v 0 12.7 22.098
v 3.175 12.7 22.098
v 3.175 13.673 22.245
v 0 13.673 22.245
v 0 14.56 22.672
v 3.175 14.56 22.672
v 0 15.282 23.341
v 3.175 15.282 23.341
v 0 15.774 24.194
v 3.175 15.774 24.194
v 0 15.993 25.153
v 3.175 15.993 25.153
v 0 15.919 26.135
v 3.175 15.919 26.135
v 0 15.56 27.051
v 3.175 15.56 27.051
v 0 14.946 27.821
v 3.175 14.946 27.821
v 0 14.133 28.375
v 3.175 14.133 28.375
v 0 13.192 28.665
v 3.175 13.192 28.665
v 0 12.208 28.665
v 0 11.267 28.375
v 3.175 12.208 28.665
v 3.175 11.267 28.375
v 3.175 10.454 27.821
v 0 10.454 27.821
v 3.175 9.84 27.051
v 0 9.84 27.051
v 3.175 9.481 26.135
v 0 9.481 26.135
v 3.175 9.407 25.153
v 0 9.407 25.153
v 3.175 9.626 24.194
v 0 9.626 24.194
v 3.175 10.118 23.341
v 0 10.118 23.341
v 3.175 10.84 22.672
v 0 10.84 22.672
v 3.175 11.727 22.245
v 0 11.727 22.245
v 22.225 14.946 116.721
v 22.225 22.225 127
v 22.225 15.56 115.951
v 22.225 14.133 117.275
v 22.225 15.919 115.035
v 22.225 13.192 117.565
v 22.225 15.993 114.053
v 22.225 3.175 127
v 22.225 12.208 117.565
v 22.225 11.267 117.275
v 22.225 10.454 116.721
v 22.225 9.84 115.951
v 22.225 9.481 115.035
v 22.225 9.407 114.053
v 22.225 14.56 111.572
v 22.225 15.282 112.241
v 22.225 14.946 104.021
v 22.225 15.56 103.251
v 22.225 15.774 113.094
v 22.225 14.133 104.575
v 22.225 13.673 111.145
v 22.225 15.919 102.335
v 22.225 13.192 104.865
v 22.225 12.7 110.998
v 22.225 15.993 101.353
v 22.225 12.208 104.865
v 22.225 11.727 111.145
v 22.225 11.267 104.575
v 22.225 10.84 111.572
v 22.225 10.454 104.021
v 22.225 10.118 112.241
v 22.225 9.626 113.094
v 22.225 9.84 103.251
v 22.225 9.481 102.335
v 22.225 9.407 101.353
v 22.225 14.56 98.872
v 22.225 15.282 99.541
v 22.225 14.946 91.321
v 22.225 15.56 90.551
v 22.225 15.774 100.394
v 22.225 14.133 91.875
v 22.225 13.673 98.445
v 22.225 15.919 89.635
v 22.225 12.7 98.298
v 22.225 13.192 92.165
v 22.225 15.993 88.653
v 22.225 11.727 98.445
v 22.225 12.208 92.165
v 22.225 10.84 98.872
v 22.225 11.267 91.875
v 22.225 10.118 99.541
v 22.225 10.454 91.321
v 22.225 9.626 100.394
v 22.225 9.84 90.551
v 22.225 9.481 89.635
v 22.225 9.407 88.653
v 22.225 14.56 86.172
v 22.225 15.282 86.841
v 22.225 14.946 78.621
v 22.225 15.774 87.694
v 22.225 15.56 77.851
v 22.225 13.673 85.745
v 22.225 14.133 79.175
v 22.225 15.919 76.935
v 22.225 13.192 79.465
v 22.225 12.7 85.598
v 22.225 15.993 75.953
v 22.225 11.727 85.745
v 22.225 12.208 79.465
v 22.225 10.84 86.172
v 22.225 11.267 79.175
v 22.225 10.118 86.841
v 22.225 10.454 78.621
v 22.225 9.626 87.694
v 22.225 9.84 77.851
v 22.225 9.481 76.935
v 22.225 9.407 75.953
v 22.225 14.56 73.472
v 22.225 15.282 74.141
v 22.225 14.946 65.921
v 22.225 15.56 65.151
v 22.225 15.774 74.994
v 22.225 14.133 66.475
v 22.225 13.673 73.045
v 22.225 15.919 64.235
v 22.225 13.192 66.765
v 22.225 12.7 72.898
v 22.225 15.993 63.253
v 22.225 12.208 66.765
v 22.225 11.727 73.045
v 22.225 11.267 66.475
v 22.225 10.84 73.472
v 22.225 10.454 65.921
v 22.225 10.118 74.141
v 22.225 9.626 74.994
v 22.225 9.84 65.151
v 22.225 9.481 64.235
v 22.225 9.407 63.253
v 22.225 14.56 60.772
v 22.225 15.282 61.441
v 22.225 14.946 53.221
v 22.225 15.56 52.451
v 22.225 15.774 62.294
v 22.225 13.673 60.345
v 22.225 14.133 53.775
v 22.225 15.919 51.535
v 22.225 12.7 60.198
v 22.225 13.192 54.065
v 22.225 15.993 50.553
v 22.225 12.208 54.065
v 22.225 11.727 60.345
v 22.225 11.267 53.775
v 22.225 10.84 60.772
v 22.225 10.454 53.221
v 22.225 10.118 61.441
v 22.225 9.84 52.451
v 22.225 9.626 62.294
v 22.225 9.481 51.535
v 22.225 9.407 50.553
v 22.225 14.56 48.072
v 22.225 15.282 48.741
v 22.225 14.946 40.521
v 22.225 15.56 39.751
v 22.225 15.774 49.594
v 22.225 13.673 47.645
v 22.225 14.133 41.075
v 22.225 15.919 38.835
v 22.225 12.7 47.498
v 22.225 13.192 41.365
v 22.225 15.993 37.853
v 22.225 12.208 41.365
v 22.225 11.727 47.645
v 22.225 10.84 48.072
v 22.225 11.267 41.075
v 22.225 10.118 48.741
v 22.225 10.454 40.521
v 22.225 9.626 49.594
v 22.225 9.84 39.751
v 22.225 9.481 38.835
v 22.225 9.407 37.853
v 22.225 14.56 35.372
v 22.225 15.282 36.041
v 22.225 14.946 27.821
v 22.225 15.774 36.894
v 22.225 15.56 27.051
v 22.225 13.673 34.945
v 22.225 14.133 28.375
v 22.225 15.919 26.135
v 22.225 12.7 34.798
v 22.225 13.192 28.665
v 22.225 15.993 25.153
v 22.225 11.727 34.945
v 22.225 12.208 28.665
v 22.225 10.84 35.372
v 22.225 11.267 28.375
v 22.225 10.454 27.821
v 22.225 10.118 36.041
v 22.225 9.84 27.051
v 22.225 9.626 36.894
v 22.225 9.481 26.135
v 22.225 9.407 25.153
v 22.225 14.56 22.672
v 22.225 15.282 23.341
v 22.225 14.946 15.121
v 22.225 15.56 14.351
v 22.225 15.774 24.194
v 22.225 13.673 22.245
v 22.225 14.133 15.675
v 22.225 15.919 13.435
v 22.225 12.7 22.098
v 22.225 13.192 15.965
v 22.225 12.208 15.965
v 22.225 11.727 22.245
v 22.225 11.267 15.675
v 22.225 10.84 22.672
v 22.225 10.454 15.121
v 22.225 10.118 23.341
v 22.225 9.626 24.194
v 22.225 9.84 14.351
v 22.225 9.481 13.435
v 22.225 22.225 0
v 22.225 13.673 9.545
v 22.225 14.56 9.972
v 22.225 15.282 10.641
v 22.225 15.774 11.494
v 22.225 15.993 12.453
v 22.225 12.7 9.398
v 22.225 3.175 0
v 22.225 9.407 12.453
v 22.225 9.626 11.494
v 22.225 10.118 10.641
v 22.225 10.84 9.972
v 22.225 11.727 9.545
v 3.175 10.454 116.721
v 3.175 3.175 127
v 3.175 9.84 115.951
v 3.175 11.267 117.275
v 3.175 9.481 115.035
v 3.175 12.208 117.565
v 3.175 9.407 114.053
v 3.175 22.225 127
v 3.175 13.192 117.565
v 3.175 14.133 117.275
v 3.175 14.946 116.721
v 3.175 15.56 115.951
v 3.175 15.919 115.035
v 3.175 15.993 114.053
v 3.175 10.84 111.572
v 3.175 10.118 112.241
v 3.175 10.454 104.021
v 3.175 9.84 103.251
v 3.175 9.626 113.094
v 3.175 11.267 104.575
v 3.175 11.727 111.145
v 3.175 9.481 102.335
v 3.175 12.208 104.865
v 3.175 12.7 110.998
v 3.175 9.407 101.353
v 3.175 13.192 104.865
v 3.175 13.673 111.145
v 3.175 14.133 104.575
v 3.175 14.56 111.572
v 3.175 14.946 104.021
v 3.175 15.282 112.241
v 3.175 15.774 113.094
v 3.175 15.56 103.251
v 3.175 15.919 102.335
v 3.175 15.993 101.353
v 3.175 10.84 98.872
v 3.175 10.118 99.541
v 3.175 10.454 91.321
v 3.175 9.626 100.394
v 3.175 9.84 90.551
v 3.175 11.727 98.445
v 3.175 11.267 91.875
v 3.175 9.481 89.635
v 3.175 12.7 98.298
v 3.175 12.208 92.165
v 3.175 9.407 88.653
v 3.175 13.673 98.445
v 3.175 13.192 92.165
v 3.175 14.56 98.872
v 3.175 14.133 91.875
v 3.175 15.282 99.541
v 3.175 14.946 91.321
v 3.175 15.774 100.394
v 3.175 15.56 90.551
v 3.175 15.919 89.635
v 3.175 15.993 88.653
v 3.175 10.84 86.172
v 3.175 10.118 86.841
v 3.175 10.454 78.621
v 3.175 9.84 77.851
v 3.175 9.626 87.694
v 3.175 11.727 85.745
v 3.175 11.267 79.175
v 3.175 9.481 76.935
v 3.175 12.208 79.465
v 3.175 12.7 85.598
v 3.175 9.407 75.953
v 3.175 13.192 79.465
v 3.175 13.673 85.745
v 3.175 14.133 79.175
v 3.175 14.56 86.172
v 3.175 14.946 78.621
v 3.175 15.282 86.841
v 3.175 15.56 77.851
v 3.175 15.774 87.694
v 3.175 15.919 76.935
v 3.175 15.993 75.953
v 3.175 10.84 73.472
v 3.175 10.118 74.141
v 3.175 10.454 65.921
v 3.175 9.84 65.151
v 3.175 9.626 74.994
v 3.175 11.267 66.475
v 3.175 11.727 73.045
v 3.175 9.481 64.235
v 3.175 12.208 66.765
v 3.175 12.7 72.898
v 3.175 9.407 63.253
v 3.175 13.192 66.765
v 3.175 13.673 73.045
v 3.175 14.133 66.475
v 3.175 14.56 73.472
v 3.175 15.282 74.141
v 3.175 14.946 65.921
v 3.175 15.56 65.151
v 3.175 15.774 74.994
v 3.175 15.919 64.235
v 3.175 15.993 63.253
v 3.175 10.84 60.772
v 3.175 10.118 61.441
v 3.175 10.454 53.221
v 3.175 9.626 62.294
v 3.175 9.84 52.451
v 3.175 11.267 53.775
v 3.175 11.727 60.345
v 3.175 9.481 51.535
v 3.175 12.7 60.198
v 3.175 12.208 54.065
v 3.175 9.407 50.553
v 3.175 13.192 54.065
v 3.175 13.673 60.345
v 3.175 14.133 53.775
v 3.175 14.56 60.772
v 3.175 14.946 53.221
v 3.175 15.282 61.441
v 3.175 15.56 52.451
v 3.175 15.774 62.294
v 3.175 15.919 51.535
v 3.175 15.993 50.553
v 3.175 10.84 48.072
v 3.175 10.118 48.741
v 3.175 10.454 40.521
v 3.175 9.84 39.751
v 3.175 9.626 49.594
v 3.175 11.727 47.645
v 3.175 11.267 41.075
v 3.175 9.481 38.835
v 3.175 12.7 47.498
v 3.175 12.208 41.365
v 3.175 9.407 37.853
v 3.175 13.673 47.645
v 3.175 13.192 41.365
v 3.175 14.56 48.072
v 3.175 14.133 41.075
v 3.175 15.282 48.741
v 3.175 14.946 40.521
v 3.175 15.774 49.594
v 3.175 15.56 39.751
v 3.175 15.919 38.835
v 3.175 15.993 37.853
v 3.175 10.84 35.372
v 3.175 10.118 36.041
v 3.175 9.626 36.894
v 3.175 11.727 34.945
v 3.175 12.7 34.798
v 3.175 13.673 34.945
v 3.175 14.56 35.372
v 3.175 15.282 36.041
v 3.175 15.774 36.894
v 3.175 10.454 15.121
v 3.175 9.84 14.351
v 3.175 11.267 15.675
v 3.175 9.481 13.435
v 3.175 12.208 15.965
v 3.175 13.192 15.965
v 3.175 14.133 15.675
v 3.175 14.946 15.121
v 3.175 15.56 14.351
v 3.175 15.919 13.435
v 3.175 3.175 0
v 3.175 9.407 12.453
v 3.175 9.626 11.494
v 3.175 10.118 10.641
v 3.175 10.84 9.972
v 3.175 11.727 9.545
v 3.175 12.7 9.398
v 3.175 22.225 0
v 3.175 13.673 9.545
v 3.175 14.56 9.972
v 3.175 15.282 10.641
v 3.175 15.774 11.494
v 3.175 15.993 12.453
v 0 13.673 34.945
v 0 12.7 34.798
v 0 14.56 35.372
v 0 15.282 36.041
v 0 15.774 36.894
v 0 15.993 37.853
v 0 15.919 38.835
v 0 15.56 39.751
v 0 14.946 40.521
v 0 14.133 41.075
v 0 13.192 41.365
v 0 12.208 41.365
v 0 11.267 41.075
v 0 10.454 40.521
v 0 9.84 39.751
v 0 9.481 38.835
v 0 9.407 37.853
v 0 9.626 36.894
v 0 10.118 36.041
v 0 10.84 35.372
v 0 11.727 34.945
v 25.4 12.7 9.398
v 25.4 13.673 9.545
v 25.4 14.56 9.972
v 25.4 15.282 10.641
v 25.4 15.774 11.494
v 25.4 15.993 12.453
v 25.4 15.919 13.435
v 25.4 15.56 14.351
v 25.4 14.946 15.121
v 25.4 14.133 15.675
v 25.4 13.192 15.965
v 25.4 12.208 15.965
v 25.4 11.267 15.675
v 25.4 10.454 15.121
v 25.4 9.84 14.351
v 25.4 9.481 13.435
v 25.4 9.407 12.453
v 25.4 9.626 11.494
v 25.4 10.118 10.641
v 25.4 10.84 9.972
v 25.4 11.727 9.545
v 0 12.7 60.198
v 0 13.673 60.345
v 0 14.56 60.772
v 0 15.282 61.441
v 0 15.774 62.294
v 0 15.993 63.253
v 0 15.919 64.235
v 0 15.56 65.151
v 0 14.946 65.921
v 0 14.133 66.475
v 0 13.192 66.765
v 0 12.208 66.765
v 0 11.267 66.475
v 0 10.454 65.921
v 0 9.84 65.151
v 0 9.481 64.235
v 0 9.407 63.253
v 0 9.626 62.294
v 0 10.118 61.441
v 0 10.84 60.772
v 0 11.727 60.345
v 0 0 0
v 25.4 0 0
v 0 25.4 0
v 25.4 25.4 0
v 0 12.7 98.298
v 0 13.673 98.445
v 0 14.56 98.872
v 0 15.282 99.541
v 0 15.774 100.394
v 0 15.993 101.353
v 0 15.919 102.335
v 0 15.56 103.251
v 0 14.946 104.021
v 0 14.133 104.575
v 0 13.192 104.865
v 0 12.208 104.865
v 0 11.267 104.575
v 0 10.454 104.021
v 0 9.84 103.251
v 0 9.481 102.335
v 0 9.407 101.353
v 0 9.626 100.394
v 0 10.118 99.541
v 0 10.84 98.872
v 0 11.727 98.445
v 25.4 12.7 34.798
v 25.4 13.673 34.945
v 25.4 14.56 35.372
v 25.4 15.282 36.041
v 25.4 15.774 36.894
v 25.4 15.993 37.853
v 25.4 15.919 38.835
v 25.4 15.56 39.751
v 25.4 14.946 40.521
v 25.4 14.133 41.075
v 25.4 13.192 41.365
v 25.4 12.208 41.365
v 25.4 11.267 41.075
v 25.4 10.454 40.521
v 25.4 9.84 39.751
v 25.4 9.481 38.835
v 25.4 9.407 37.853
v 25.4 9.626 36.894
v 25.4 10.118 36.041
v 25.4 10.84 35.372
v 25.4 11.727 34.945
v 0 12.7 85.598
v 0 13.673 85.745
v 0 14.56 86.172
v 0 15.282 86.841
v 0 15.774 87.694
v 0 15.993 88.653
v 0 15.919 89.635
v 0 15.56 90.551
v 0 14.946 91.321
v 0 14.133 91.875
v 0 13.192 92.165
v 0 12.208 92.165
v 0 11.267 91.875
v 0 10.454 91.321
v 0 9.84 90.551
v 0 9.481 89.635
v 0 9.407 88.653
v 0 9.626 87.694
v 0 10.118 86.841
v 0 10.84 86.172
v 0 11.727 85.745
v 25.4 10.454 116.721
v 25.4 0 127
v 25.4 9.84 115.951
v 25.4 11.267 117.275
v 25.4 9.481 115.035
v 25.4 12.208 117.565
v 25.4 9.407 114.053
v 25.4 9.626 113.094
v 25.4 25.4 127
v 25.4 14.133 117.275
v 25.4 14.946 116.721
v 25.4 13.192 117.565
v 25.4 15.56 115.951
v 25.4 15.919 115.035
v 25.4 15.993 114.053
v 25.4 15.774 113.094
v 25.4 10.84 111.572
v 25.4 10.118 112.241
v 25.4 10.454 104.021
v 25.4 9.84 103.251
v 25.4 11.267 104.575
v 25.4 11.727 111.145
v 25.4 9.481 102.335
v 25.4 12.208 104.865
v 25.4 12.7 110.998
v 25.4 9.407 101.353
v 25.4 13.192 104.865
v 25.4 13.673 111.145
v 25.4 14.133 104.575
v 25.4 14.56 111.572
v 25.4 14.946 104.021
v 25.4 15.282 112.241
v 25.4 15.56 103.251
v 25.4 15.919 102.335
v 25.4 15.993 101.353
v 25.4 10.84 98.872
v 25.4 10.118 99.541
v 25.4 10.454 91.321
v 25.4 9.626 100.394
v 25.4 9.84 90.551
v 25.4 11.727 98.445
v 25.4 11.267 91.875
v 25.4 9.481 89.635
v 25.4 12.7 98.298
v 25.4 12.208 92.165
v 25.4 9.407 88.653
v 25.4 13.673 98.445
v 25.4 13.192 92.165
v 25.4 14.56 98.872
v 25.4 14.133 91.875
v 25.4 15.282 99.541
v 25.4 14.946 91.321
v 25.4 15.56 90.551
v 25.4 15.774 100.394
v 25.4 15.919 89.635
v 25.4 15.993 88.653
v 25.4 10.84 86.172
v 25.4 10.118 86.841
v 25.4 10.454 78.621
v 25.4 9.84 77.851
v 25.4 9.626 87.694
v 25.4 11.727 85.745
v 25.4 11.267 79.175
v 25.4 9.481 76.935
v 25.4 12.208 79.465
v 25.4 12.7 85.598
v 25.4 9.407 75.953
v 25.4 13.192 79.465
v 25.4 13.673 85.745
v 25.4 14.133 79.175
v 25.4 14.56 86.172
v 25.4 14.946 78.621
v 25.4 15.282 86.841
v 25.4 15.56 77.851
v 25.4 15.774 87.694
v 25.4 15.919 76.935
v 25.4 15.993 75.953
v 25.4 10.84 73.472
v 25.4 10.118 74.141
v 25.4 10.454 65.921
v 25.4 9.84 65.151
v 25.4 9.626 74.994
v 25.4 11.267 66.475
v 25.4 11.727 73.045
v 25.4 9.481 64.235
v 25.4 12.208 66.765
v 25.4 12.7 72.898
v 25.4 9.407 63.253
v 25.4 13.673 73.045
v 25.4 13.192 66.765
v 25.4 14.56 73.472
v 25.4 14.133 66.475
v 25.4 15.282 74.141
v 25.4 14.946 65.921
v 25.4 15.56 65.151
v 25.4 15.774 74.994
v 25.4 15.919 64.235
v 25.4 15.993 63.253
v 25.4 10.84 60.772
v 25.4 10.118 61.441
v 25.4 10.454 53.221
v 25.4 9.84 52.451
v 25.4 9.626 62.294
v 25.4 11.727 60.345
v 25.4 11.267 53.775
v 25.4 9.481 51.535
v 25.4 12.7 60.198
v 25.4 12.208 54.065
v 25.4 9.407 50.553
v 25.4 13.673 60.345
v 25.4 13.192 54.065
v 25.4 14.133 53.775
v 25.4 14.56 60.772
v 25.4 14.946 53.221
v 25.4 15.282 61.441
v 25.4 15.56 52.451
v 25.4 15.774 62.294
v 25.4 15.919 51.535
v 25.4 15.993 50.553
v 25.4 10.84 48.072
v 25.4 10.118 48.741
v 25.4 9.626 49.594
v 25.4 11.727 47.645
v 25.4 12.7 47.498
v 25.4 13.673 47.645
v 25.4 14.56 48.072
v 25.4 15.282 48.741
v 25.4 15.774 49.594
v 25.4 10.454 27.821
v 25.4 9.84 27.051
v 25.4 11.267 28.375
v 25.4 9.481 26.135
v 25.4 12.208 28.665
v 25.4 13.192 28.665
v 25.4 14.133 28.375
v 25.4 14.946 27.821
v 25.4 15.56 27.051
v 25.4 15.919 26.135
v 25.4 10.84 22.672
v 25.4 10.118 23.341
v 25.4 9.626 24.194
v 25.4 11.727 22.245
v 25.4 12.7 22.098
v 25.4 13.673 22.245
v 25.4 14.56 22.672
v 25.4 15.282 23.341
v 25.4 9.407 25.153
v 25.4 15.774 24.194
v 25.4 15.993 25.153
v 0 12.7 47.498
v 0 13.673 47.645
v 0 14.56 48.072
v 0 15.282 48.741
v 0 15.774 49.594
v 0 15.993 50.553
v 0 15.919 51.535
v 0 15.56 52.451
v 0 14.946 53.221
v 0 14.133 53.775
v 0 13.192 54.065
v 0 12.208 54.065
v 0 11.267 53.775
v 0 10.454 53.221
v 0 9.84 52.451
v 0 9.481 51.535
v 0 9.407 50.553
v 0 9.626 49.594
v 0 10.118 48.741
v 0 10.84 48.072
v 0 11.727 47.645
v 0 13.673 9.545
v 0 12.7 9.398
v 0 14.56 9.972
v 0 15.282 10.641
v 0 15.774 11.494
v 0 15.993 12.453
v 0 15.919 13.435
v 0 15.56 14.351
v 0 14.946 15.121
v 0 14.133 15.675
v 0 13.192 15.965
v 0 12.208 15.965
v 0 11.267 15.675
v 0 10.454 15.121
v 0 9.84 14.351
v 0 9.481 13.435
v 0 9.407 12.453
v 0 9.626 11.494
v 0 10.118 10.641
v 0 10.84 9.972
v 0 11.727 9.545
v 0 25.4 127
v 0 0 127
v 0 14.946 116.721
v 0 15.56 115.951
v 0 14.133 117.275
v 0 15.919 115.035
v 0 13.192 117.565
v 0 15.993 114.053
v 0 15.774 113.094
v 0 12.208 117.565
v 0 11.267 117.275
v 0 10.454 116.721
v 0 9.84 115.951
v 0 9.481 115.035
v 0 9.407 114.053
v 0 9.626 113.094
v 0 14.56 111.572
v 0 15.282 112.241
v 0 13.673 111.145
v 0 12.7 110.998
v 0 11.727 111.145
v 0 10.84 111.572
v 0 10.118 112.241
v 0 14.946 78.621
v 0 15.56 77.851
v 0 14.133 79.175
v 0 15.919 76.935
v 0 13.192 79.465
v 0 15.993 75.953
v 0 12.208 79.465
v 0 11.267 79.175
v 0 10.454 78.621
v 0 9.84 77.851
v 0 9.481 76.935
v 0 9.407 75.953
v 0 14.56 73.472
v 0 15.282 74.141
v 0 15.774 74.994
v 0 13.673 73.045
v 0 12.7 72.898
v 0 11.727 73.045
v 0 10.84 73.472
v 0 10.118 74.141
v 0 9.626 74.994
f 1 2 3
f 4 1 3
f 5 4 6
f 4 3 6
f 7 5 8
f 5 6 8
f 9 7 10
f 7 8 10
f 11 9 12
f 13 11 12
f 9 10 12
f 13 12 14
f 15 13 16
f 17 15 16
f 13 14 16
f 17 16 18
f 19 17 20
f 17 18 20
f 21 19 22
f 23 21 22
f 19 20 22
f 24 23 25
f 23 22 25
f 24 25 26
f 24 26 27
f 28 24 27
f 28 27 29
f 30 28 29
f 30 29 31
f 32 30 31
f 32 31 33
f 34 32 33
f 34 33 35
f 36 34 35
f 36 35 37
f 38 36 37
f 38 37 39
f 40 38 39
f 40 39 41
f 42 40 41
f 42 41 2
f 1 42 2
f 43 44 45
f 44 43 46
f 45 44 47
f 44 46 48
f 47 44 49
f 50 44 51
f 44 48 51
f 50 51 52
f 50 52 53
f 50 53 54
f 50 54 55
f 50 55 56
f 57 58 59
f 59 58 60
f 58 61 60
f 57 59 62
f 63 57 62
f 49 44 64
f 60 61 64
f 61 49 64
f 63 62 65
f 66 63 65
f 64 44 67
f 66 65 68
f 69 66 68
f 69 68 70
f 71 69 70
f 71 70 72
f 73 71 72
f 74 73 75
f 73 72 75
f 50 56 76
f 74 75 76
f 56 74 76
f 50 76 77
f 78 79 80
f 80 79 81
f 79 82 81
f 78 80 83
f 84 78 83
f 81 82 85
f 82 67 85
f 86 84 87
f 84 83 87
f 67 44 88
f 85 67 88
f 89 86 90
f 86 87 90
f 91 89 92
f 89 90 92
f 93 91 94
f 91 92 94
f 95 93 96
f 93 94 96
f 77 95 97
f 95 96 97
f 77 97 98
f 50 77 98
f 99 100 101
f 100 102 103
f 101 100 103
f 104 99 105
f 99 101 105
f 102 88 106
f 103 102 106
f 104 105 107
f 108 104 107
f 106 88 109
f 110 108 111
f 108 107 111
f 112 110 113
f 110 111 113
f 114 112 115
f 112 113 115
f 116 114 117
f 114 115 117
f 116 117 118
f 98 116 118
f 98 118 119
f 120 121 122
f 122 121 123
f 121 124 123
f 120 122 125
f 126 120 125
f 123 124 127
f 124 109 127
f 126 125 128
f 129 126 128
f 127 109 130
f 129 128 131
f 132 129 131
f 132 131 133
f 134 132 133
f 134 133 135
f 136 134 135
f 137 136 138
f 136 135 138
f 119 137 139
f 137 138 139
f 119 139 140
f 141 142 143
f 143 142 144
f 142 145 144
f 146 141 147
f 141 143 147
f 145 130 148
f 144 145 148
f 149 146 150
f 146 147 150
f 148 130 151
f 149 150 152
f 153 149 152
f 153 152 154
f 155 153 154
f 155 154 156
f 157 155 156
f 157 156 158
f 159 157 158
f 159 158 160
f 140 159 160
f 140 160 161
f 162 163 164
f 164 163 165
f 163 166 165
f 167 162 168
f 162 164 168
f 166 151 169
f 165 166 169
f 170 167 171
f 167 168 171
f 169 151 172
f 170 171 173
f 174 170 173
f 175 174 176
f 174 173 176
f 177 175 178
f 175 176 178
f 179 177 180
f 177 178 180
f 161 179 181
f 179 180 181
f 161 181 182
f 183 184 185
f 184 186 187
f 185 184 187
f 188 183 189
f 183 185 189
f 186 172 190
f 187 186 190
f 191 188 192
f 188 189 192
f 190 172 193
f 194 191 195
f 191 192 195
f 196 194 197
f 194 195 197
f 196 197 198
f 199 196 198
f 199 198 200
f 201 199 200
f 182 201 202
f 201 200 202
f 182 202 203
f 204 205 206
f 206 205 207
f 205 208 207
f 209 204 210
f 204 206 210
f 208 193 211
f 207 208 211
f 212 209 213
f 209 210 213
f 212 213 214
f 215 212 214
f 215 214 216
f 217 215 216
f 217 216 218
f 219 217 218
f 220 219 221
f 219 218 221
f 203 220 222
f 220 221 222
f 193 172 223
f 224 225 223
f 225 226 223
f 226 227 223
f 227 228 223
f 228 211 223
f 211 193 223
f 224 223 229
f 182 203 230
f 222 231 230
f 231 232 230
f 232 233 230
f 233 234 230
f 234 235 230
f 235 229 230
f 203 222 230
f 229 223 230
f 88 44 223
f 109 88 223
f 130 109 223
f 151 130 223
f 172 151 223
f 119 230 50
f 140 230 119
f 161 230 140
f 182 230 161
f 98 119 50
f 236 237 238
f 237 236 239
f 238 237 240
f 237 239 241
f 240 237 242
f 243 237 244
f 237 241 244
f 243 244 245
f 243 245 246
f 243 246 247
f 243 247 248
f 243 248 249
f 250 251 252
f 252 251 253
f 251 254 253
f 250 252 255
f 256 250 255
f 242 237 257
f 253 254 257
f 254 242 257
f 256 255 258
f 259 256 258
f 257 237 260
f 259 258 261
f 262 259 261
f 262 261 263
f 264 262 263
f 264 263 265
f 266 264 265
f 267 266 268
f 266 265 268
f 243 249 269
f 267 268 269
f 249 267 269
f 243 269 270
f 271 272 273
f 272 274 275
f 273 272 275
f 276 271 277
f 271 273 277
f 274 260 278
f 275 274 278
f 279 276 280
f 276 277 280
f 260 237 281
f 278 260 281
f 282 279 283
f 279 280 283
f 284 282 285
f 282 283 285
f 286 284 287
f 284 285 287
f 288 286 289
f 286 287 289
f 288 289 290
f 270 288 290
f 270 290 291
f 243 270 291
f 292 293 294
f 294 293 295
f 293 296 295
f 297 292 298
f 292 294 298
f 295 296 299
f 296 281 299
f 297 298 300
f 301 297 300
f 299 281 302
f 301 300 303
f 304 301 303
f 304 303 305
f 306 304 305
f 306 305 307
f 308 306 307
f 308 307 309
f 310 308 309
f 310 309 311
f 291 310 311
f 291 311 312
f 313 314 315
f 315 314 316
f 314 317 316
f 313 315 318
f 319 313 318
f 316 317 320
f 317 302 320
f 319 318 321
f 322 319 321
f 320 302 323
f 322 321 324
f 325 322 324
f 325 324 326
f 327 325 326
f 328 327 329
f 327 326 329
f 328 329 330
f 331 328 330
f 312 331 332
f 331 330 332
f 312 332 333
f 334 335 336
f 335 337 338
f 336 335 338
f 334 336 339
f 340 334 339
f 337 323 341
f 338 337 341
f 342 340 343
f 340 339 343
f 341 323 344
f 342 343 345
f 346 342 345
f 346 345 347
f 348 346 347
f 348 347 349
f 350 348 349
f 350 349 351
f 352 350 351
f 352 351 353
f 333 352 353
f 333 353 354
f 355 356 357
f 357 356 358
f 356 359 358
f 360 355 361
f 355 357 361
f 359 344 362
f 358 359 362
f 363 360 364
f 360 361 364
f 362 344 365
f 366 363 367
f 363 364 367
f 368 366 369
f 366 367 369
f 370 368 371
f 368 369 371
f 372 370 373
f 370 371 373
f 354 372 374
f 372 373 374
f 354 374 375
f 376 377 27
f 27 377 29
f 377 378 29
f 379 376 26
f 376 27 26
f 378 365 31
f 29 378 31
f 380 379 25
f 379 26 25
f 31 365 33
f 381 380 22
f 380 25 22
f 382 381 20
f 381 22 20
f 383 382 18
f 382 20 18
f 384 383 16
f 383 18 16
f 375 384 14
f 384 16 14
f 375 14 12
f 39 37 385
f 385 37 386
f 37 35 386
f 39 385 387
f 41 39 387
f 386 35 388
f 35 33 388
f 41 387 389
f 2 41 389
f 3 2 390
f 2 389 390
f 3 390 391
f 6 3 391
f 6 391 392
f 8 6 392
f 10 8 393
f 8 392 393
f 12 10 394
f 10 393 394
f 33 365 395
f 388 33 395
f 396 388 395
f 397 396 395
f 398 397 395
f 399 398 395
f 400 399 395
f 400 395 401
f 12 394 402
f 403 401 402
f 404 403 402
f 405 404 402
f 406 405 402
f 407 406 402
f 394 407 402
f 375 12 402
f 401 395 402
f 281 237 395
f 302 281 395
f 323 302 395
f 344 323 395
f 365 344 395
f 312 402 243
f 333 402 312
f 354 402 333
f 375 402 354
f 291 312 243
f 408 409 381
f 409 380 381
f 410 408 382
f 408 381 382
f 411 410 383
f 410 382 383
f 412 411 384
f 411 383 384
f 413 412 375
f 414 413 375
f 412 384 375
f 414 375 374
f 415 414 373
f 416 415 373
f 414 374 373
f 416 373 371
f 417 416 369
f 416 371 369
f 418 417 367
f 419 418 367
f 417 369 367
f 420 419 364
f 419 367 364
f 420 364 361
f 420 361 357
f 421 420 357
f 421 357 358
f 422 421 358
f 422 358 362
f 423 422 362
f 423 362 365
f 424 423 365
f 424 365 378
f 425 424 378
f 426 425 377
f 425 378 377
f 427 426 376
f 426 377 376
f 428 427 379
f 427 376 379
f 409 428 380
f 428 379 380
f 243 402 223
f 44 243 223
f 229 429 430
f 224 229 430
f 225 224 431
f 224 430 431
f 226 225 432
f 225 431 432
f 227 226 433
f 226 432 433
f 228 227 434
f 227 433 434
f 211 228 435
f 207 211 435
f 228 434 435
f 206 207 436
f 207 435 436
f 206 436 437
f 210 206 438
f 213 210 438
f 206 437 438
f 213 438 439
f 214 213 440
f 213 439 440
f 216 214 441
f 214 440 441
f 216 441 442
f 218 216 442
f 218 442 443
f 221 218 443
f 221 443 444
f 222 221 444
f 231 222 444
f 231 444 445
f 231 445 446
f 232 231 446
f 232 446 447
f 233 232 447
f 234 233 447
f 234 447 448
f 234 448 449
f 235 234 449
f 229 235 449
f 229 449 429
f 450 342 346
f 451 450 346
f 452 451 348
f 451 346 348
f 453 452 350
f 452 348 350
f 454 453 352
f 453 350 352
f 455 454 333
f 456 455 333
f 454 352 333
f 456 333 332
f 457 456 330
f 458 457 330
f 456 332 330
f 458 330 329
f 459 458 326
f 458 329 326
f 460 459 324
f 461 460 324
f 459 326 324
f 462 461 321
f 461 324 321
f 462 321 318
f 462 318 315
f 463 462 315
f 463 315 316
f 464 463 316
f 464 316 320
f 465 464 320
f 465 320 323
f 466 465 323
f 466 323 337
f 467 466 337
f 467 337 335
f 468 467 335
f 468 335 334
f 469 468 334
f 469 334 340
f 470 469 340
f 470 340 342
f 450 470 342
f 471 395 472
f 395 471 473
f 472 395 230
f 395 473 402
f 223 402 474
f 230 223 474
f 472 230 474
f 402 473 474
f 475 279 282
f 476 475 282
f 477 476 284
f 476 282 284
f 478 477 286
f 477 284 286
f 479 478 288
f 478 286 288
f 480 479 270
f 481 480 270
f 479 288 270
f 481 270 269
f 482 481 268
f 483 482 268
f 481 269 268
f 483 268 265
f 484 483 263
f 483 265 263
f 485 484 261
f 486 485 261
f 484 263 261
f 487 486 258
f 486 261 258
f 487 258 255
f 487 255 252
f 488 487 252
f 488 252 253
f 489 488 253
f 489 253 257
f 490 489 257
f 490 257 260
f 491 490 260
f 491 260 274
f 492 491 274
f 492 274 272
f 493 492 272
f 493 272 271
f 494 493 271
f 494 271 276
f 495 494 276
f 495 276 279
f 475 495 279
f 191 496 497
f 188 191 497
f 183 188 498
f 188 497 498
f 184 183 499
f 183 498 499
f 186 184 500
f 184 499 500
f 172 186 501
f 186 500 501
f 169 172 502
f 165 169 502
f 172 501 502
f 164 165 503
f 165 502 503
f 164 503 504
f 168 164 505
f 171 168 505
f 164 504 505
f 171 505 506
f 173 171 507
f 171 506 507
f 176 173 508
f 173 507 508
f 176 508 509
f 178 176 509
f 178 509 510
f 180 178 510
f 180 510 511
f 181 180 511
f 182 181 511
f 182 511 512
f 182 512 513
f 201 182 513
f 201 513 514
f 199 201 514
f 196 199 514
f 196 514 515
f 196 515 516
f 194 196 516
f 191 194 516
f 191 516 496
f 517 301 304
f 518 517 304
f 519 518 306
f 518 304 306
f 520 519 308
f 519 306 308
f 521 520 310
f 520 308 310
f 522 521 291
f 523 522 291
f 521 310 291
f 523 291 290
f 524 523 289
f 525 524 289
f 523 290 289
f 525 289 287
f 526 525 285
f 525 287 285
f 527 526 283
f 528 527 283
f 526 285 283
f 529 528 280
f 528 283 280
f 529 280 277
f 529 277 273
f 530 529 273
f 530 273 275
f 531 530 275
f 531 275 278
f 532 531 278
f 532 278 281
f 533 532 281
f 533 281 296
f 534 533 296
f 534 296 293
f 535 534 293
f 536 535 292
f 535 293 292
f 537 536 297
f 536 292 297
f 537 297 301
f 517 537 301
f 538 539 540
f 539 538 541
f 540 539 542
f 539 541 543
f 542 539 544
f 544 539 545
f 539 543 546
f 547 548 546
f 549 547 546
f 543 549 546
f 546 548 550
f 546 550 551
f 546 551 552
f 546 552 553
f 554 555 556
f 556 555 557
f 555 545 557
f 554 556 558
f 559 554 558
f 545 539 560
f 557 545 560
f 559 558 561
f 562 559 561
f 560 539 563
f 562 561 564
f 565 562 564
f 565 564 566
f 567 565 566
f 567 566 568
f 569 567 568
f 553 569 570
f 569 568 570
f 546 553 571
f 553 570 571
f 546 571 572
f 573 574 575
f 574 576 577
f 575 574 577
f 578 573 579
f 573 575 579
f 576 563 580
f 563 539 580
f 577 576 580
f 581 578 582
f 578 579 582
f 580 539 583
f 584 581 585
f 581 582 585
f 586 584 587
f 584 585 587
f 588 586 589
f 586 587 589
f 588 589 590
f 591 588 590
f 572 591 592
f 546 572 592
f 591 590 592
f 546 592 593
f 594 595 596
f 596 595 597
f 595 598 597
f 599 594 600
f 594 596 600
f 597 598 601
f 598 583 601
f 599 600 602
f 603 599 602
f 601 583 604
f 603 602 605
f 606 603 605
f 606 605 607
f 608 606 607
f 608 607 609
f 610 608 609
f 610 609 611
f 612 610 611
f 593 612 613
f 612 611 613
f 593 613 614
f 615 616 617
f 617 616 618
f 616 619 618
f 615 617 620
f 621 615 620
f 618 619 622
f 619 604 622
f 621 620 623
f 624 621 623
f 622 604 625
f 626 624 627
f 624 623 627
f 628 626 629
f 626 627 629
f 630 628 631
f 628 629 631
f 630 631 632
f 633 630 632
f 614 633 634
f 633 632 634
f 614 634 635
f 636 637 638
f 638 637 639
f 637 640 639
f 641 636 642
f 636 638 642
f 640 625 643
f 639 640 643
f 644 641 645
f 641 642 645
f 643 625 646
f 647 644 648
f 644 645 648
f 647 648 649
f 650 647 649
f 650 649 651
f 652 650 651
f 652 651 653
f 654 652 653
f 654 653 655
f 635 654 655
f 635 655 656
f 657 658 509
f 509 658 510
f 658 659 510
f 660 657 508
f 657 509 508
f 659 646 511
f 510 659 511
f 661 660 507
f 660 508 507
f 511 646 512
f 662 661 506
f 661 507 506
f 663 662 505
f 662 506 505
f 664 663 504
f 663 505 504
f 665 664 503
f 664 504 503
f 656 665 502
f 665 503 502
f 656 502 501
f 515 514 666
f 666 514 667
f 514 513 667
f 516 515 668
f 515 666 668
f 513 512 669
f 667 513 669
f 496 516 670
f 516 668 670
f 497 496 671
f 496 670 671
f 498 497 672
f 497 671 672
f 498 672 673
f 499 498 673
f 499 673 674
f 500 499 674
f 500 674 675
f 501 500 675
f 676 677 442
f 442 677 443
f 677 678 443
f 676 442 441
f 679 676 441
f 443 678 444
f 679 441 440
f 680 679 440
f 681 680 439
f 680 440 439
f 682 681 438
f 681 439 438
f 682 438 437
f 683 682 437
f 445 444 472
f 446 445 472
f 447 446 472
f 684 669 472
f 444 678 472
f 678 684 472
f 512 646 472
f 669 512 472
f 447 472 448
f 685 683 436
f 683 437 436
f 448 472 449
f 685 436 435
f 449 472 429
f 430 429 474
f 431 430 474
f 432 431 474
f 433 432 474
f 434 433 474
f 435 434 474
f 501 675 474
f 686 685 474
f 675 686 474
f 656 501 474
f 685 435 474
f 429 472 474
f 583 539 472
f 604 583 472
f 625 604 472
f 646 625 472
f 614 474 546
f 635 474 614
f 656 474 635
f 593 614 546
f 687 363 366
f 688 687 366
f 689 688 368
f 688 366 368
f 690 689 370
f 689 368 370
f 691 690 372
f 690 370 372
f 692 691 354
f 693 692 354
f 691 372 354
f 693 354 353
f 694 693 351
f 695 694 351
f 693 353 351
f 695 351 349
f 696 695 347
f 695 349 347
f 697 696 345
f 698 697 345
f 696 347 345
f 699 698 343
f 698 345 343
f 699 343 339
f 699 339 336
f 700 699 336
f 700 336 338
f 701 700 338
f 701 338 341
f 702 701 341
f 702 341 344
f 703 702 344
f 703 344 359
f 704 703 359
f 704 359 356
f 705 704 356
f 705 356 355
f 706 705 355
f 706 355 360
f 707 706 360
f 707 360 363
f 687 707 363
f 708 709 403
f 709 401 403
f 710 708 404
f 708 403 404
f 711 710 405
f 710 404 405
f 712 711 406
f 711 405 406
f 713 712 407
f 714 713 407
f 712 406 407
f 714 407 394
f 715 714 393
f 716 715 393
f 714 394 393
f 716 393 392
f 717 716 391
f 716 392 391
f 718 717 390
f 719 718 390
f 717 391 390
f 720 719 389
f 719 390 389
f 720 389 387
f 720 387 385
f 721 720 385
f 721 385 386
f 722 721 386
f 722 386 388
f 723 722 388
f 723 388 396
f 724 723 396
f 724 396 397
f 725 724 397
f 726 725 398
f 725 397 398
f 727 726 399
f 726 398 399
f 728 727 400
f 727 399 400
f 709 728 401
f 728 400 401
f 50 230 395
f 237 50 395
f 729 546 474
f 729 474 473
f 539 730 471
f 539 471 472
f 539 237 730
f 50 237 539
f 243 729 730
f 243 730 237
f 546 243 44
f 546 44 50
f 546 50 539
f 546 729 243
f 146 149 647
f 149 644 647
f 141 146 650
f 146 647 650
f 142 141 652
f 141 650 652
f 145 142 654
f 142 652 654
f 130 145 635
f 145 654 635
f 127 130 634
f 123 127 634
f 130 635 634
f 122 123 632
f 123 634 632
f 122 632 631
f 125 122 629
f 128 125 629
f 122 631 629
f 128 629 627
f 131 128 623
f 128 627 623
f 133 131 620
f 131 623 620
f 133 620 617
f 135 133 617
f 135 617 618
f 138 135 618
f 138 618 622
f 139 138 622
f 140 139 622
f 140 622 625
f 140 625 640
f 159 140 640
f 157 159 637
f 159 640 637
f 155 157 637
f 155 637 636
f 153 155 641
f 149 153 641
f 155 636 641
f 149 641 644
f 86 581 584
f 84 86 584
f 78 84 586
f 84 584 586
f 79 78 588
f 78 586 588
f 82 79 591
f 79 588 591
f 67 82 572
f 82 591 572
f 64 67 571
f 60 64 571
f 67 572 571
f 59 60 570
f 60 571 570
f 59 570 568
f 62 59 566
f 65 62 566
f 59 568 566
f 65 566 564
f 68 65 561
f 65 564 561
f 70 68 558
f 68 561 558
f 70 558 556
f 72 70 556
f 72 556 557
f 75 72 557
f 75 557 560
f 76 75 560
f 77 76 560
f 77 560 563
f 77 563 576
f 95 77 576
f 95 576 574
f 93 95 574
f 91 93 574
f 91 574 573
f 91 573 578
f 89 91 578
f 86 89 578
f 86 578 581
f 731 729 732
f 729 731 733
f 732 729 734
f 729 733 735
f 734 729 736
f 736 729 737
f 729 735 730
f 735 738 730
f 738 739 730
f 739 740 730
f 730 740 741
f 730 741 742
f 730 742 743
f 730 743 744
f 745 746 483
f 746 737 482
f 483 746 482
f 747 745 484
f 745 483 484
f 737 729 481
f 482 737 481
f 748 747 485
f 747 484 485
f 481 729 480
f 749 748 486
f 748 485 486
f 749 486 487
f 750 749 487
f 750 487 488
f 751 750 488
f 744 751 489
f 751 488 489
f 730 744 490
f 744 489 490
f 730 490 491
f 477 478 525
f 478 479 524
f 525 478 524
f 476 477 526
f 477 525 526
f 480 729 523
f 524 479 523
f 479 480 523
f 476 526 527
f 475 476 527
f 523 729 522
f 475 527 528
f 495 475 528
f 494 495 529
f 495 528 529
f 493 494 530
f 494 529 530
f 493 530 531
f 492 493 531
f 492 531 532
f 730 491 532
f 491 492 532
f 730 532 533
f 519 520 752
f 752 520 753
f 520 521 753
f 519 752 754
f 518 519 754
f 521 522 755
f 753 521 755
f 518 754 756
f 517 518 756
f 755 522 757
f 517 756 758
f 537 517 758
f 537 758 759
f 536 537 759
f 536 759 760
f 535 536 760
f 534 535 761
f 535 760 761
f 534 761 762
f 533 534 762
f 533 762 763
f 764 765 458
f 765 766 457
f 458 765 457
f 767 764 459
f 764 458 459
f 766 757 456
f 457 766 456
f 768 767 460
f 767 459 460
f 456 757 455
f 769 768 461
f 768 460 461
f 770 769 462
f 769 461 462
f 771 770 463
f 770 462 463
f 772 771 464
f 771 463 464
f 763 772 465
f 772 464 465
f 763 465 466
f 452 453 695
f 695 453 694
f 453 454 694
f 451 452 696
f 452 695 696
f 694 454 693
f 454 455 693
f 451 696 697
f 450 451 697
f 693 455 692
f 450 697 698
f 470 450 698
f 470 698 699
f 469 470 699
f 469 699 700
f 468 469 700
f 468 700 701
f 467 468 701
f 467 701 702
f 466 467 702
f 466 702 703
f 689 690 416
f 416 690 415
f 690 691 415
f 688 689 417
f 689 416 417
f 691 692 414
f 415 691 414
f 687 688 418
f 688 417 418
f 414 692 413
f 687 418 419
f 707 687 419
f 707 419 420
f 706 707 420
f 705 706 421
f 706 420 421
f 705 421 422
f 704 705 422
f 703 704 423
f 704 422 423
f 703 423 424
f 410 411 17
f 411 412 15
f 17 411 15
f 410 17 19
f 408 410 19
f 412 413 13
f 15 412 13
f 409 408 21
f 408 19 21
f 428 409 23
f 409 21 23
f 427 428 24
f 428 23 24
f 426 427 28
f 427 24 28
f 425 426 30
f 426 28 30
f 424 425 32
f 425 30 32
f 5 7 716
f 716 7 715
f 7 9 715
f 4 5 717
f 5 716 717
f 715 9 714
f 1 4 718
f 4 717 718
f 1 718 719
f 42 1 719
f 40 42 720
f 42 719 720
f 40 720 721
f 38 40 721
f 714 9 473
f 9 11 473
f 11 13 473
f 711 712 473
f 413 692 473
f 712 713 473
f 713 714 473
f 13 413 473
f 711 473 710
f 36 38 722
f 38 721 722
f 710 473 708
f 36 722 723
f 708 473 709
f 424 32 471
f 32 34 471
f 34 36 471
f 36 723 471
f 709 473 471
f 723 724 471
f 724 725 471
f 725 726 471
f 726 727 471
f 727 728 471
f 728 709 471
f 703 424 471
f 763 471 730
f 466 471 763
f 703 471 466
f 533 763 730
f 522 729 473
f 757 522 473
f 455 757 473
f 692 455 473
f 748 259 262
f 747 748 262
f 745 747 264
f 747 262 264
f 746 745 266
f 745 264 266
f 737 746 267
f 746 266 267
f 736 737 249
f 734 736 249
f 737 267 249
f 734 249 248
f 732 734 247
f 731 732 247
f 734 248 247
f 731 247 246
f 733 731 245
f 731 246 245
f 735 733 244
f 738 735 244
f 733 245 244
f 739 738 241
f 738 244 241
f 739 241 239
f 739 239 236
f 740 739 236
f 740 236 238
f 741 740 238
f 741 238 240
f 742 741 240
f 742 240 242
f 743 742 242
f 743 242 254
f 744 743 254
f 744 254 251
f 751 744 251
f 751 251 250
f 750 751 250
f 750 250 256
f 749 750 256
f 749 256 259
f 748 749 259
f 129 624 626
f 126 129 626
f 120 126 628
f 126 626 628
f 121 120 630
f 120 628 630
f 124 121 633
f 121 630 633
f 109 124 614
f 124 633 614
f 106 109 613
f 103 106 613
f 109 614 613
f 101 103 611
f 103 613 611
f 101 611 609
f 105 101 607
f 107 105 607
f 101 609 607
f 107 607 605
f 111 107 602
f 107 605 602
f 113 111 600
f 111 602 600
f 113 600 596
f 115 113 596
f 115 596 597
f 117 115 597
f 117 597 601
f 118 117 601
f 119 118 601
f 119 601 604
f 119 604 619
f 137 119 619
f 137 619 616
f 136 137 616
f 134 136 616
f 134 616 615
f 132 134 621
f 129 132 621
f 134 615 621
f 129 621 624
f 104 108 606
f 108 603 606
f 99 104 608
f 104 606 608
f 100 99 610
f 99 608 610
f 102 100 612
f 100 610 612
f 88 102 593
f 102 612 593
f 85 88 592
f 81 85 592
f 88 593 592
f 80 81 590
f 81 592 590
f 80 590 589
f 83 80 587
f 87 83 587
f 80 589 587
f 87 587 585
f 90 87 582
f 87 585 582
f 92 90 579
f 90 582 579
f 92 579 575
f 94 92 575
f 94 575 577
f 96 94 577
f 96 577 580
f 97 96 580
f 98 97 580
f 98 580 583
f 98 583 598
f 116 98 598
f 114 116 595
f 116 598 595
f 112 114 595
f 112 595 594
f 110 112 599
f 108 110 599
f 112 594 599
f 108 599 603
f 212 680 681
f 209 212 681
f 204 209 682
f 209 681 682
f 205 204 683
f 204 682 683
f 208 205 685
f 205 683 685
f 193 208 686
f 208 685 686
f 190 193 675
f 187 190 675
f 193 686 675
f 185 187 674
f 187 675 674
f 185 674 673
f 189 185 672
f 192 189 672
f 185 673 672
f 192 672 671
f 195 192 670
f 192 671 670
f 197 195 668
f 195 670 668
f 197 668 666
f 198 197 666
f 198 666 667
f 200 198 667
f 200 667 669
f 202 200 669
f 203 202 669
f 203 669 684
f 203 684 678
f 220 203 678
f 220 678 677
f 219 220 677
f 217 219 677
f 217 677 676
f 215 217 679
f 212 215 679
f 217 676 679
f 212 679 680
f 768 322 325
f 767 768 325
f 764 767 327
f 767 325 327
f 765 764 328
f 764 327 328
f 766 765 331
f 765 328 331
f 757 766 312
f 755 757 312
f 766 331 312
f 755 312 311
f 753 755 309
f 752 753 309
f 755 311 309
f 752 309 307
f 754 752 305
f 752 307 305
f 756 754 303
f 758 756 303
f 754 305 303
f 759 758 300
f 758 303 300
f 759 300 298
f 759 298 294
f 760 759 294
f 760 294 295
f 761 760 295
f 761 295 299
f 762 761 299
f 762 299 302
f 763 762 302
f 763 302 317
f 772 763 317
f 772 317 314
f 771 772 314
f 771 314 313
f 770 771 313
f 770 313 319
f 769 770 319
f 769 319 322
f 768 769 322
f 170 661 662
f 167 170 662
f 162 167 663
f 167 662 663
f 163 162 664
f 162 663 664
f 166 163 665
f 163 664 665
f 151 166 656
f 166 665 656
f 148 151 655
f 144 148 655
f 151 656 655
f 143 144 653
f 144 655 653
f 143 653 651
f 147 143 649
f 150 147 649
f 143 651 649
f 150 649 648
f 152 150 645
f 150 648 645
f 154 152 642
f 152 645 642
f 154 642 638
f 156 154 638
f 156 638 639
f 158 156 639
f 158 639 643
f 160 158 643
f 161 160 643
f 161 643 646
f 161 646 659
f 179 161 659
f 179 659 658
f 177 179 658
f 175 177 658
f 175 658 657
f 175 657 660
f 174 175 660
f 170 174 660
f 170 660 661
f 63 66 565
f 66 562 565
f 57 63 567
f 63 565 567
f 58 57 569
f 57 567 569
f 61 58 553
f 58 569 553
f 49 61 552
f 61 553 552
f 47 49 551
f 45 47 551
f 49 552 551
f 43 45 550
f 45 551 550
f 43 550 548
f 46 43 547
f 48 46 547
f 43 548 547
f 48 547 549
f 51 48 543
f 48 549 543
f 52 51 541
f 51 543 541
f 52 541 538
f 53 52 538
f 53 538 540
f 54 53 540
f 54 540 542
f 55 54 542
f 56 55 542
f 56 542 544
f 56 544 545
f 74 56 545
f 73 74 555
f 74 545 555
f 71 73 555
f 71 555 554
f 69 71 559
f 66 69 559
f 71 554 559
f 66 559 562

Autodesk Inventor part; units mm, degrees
ref_plane "YZ Plane" through (0, 0, 0) normal (1, 0, 0) x (0, 1, 0)
ref_plane "XZ Plane" through (0, 0, 0) normal (0, 1, 0) x (-1, 0, 0)
ref_plane "XY Plane" through (0, 0, 0) normal (0, 0, 1) x (1, 0, 0)
sketch "Sketch1" plane through (0, 0, 0) normal (0, 0, 1) x (1, 0, 0)
  line L0 (0, 0) -> (25.4, 0)
  line L1 (25.4, 0) -> (25.4, 25.4)
  line L2 (25.4, 25.4) -> (0, 25.4)
  line L3 (0, 25.4) -> (0, 0)
  line L4 (3.175, 22.225) -> (22.225, 22.225)
  line L5 (22.225, 22.225) -> (22.225, 3.175)
  line L6 (22.225, 3.175) -> (3.175, 3.175)
  line L7 (3.175, 3.175) -> (3.175, 22.225)
  dimension "d0" = 25.4
  dimension "d1" = 25.4
  dimension "d2" = 3.175
extrude "Extrusion1" add sketch "Sketch1" along normal blind 127
sketch "Sketch2" plane through (25.4, 0, 0) normal (1, 0, 0) x (0, 0, -1)
  line L0 (0, 0) -> (0, 25.4) projected
  line L1 (-127, 0) -> (-127, 25.4) projected
  line L2 (0, 0) -> (-127, 0) projected
  line L3 (-127, 12.7) -> (-114.3, 12.7) construction
  line L4 (0, 12.7) -> (-12.7, 12.7) construction
  circle A0 centre (-114.3, 12.7) radius 3.302
  line L5 (0, 25.4) -> (-127, 25.4) projected
  line L6 (-114.3, 12.7) -> (-12.7, 12.7) construction
  circle A1 centre (-101.6, 12.7) radius 3.302
  circle A2 centre (-88.9, 12.7) radius 3.302
  circle A3 centre (-76.2, 12.7) radius 3.302
  circle A4 centre (-63.5, 12.7) radius 3.302
  circle A5 centre (-50.8, 12.7) radius 3.302
  circle A6 centre (-38.1, 12.7) radius 3.302
  circle A7 centre (-25.4, 12.7) radius 3.302
  circle A8 centre (-12.7, 12.7) radius 3.302
  dimension "d5" = 12.7
  dimension "d7" = 6.604
  dimension "d13" = 127
  dimension "d16" = 12.7
extrude "Extrusion2" cut sketch "Sketch2" against normal through all contours A0 | A1 | A2 | A3 | A4 | A5 | A6 | A7 | A8
equation "\"d16\" = -0.25 * d5 + 0.125 * d13"
properties part number "Chassis V1.500 Part8" material "Aluminum 6061"
